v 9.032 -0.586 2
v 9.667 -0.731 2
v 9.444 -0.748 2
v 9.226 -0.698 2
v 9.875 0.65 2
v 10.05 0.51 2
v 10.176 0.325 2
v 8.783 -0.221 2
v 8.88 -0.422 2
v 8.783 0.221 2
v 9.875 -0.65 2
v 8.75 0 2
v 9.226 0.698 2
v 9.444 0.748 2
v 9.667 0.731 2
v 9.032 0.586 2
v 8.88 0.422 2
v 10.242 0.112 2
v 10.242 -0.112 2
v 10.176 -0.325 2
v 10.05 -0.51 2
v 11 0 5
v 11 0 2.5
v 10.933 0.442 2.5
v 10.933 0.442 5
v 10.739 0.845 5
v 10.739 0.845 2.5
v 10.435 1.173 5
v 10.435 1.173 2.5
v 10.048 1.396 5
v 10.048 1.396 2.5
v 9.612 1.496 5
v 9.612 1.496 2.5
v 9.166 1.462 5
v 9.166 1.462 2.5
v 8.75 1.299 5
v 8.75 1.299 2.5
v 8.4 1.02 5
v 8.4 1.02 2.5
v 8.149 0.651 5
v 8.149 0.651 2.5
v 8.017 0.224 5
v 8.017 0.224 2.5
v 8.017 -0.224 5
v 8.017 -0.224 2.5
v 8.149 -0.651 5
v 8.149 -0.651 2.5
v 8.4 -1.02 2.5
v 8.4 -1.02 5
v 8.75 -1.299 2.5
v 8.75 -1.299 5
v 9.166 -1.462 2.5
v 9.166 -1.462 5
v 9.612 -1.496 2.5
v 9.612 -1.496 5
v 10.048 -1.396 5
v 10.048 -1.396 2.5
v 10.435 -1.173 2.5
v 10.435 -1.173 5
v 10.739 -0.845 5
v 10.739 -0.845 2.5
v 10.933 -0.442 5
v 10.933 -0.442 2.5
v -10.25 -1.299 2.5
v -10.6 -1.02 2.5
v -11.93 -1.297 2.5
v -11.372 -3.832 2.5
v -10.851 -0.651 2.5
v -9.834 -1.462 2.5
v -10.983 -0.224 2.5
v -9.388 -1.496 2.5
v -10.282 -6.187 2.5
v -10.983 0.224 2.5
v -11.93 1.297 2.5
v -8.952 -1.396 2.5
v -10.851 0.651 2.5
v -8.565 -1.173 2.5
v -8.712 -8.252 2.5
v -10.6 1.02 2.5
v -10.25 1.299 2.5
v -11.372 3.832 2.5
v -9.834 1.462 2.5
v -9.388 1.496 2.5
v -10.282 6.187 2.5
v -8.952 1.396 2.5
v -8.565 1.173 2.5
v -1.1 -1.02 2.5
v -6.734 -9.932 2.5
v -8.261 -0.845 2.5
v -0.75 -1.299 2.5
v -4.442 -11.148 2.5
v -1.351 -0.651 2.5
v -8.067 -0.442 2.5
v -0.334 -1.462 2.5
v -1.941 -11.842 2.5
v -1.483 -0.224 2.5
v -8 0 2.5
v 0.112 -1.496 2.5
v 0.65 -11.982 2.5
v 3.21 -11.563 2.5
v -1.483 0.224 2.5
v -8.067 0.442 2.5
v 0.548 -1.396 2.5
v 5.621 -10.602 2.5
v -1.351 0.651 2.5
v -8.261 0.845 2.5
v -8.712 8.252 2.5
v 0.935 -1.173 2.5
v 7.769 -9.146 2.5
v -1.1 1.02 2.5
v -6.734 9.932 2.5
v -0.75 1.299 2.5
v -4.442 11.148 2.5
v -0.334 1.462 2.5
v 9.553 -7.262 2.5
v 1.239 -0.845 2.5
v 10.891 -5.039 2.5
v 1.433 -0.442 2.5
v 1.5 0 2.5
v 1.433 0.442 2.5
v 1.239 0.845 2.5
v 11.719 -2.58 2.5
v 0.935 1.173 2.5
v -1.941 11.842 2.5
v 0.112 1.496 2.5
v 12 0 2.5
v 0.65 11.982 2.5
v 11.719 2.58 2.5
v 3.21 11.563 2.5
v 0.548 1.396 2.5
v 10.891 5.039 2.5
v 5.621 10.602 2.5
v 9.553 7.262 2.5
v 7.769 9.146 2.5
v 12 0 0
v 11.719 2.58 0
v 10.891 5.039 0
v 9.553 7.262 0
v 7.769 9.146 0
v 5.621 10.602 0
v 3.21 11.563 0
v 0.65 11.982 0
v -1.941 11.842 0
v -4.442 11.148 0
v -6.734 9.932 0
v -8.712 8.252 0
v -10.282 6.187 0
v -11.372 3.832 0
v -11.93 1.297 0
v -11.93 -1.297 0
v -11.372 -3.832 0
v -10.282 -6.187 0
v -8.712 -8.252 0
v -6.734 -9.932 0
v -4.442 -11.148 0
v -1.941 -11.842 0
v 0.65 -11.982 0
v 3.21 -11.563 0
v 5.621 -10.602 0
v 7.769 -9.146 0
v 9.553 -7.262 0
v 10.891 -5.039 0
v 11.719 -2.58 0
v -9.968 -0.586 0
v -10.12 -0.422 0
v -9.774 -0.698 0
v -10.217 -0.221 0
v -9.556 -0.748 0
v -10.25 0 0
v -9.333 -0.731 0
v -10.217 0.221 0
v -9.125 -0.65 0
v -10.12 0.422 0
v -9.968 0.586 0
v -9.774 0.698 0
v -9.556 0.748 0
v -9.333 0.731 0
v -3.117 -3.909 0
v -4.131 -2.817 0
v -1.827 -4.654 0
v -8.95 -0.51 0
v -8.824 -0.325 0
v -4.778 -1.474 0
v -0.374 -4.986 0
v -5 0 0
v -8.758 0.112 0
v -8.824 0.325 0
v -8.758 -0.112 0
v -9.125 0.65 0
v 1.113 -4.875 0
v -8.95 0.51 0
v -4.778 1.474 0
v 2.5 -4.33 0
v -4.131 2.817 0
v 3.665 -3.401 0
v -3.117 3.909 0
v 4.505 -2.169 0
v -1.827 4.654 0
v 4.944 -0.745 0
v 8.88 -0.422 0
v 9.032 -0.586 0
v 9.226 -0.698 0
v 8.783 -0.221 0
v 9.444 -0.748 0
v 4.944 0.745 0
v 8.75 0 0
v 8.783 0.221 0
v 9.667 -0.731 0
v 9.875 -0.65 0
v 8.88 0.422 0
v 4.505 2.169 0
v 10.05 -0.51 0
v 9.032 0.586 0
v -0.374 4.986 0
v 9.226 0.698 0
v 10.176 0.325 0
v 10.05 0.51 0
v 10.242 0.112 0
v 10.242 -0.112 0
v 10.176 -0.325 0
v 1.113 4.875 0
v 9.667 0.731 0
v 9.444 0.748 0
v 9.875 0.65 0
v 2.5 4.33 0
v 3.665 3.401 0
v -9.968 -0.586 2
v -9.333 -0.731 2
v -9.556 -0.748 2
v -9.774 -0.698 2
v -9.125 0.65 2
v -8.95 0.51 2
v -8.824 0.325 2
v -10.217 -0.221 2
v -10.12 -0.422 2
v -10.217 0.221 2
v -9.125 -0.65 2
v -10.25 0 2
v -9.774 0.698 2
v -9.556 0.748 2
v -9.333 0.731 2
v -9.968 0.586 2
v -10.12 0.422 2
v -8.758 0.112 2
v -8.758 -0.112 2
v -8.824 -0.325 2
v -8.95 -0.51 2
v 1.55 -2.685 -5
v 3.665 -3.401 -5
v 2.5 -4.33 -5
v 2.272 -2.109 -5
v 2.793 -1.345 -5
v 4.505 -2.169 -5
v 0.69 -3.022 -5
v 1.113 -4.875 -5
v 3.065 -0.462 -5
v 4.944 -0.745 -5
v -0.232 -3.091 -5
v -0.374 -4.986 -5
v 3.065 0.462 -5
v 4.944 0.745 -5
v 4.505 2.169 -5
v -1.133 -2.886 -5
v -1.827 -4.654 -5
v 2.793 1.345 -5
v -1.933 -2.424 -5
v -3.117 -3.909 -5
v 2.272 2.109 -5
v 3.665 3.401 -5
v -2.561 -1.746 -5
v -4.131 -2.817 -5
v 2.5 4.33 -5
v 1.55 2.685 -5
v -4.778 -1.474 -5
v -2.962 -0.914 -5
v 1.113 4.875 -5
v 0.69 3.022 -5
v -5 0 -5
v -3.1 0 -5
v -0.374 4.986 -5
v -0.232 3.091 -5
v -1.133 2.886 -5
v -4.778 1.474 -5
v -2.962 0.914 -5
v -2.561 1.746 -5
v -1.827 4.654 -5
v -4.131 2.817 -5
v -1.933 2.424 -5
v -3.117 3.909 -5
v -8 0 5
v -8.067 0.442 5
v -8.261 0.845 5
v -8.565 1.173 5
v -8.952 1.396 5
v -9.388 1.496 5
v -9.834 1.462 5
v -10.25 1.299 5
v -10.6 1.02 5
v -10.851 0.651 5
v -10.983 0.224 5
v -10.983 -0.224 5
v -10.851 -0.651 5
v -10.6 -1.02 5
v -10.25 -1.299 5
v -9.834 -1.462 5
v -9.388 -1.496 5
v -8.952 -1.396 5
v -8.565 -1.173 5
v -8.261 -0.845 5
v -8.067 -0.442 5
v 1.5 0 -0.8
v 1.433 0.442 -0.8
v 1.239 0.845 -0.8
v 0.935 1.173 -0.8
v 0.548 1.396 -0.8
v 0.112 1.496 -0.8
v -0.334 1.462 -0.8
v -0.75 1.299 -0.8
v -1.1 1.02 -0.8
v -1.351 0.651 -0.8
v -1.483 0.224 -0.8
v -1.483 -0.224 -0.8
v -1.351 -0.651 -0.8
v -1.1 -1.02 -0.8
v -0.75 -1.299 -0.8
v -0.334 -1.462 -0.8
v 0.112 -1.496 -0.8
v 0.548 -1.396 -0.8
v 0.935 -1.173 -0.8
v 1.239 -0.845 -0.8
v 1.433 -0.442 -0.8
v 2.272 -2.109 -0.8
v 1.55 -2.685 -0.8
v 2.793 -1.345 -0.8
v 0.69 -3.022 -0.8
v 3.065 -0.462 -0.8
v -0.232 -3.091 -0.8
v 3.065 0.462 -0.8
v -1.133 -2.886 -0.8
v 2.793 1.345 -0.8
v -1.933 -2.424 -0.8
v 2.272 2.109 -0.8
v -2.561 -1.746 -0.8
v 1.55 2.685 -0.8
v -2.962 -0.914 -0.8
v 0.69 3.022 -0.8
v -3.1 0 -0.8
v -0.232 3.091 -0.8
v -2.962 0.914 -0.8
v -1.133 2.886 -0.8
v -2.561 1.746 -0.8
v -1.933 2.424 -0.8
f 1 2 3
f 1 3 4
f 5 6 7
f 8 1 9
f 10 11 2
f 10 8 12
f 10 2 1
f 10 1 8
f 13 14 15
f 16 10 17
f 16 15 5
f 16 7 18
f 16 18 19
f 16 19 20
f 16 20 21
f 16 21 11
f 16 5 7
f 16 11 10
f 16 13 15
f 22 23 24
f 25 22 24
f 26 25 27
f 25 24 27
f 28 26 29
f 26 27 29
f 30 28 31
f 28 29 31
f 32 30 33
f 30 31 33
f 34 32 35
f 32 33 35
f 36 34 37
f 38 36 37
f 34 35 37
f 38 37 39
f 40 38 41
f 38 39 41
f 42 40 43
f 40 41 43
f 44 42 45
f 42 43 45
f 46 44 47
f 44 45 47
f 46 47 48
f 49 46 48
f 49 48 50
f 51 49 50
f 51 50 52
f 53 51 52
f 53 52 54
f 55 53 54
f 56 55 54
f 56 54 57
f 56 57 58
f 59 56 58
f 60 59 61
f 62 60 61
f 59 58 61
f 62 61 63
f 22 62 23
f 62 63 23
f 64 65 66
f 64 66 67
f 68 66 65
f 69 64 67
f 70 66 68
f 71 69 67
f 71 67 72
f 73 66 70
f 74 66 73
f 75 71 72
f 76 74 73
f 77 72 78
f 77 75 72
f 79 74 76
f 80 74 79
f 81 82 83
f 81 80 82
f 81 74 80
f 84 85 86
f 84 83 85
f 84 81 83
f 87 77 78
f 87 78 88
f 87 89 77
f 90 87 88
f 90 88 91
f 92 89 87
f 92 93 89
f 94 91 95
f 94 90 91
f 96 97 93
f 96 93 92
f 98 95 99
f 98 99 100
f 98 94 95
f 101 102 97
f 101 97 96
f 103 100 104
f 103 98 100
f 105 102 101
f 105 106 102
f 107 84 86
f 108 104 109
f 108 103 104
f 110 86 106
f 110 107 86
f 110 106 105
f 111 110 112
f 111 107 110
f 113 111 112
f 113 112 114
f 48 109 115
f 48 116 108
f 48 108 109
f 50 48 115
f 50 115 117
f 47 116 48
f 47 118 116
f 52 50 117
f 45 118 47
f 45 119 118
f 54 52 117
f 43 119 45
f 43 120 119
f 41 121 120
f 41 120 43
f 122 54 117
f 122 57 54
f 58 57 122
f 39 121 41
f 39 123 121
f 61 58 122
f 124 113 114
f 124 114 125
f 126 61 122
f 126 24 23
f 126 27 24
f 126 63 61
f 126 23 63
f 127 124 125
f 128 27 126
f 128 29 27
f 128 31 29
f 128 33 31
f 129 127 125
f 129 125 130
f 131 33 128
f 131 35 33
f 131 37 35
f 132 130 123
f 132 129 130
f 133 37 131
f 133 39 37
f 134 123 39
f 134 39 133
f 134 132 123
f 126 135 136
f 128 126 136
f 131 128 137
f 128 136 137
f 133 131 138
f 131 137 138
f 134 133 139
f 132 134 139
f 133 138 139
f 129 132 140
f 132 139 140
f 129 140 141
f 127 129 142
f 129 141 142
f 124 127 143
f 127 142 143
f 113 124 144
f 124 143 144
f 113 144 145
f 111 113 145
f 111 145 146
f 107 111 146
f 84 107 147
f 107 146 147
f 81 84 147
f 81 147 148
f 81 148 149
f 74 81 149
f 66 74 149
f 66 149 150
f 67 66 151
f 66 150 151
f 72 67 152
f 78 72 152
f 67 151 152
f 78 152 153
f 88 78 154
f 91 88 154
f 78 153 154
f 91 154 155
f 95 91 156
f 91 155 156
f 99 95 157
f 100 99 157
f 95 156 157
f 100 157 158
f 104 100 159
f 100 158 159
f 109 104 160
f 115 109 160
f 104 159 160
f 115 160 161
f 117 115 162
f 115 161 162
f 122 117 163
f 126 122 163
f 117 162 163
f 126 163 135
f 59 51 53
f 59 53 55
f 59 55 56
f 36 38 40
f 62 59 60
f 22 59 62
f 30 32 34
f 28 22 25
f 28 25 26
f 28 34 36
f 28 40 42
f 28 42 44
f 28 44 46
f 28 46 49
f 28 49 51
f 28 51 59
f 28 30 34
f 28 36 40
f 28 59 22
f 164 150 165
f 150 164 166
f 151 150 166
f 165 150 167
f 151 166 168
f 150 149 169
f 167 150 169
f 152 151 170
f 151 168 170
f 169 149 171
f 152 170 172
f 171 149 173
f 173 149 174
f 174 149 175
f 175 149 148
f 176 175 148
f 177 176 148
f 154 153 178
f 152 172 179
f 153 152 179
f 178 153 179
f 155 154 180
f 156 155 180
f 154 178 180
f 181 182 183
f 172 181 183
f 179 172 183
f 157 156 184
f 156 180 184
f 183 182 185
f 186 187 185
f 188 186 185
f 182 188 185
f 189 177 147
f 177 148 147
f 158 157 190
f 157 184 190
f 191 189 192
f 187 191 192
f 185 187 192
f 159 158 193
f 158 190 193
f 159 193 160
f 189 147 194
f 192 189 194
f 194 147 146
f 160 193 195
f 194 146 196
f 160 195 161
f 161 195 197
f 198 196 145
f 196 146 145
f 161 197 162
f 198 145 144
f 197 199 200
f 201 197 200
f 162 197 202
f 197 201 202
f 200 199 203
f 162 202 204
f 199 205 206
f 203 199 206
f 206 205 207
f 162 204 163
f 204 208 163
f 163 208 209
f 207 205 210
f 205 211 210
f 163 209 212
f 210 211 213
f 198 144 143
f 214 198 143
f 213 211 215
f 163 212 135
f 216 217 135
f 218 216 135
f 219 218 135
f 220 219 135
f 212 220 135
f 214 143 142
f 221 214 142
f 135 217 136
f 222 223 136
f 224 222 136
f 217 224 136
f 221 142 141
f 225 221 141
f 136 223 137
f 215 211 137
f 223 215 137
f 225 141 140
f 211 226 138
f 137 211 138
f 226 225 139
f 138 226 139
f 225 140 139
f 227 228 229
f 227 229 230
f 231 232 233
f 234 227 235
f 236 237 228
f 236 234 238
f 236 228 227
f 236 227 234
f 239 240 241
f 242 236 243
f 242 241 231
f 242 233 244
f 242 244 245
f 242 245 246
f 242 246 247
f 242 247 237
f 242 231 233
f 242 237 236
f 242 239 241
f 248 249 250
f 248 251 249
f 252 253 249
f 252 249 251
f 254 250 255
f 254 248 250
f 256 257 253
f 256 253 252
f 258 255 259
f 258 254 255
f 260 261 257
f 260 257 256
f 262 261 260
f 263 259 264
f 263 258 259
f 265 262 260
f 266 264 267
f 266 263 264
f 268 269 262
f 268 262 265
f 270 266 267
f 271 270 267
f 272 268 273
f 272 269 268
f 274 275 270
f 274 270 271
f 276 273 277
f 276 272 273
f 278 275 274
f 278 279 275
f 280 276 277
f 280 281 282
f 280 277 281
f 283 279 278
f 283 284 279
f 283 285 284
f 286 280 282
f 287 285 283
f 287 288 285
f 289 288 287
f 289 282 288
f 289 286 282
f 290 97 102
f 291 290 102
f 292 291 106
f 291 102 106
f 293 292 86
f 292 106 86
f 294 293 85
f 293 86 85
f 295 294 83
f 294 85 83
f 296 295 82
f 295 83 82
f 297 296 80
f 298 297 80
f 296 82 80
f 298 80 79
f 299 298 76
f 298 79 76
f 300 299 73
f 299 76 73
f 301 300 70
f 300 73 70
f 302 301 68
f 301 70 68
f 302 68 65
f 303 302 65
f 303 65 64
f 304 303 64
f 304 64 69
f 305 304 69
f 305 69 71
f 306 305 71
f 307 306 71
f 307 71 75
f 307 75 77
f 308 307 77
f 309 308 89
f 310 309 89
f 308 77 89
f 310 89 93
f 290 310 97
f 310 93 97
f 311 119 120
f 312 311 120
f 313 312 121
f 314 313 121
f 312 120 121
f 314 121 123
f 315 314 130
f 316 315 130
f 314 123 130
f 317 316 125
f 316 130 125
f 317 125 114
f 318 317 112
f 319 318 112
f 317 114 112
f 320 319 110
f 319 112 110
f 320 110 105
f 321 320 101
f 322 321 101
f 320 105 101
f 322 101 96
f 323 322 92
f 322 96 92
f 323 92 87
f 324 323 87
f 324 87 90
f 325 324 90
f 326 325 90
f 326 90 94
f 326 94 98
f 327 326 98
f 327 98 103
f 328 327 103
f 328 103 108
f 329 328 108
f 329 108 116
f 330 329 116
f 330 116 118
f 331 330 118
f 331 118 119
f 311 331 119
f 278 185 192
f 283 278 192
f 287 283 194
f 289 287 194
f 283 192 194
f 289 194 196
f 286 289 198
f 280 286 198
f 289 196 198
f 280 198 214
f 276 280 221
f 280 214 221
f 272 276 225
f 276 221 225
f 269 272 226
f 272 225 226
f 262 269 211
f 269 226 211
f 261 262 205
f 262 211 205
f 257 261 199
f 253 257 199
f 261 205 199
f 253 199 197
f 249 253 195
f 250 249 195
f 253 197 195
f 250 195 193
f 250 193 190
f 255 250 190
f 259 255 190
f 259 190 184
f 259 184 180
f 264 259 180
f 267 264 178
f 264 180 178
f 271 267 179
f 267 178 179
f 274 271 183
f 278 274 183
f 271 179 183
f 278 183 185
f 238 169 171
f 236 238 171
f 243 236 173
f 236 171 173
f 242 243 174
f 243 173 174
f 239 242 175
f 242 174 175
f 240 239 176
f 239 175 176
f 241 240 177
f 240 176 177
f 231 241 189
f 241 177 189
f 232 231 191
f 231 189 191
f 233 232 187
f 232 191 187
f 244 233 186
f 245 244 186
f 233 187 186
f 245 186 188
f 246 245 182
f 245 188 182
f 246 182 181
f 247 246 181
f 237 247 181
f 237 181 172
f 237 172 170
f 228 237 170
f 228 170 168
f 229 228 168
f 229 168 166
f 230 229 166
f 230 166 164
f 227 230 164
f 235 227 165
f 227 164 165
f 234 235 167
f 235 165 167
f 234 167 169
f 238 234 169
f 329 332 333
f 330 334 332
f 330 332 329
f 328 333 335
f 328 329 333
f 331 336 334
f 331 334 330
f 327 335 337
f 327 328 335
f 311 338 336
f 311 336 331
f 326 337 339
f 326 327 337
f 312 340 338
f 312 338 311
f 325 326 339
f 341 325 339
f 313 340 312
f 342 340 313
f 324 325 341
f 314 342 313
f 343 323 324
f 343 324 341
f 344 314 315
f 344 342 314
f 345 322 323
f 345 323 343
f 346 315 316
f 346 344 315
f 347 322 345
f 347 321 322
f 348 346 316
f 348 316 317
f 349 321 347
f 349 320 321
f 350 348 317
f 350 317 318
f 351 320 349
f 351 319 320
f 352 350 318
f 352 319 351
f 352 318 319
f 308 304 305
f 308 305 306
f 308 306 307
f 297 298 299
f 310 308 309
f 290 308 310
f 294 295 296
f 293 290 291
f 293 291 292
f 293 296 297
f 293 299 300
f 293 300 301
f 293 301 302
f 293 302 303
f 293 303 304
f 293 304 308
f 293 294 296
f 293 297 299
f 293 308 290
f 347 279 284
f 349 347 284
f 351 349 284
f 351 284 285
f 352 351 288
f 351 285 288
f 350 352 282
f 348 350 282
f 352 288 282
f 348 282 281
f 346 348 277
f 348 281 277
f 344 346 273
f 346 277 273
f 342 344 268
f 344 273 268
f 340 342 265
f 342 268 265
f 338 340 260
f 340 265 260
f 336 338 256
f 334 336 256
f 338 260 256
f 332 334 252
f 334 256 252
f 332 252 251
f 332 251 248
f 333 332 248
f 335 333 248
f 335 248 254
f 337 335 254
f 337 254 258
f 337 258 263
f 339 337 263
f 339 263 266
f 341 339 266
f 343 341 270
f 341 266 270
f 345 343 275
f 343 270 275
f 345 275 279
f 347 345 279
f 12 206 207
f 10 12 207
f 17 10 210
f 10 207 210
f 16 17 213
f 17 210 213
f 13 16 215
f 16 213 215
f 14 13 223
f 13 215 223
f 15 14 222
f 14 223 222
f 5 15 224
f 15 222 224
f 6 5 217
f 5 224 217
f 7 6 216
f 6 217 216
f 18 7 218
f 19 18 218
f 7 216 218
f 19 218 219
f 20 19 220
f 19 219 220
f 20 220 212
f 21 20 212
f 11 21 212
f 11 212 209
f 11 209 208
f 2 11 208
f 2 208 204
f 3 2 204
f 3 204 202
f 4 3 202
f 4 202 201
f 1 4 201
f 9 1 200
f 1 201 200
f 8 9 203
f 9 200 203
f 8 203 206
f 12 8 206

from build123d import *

# Parameters (mm, degrees)
CROQUIS1_R              = 12
SALIENTE_EXTRUIR1_DEPTH = 2.5
CROQUIS2_R              = 5
SALIENTE_EXTRUIR2_DEPTH = 5
CROQUIS3_R              = 3.1
CORTAR_EXTRUIR1_DEPTH   = 4.2
CROQUIS4_R              = 1.5
CORTAR_EXTRUIR2_DEPTH   = 4
CROQUIS5_R              = 1.5
SALIENTE_EXTRUIR3_DEPTH = 2.5
CROQUIS6_R              = 0.75
CORTAR_EXTRUIR3_DEPTH   = 2


with BuildPart() as part:
    # Croquis1 → Saliente-Extruir1 (new body)
    with BuildSketch(Plane.XY):
        Circle(CROQUIS1_R)
    extrude(amount=SALIENTE_EXTRUIR1_DEPTH)

    # Croquis2 → Saliente-Extruir2 (add)
    with BuildSketch(Plane(origin=(0, 0, 0), x_dir=(-1, 0, 0), z_dir=(0, 0, -1))):
        Circle(CROQUIS2_R)
    extrude(amount=SALIENTE_EXTRUIR2_DEPTH)

    # Croquis3 → Cortar-Extruir1 (cut)
    with BuildSketch(Plane(origin=(0, 0, -5), x_dir=(-1, 0, 0), z_dir=(0, 0, -1))):
        Circle(CROQUIS3_R)
    extrude(amount=-CORTAR_EXTRUIR1_DEPTH, mode=Mode.SUBTRACT)

    # Croquis4 → Cortar-Extruir2 (cut)
    with BuildSketch(Plane.XY.offset(2.5)):
        Circle(CROQUIS4_R)
    extrude(amount=-CORTAR_EXTRUIR2_DEPTH, mode=Mode.SUBTRACT)

    # Croquis5 → Saliente-Extruir3 (add)
    with BuildSketch(Plane.XY.offset(2.5)):
        with Locations((9.5, 0)):
            Circle(CROQUIS5_R)
        with Locations((-9.5, 0)):
            Circle(CROQUIS5_R)
    extrude(amount=SALIENTE_EXTRUIR3_DEPTH)

    # Croquis6 → Cortar-Extruir3 (cut)
    with BuildSketch(Plane(origin=(0, 0, 0), x_dir=(-1, 0, 0), z_dir=(0, 0, -1))):
        with Locations((-9.5, 0)):
            Circle(CROQUIS6_R)
        with Locations((9.5, 0)):
            Circle(CROQUIS6_R)
    extrude(amount=-CORTAR_EXTRUIR3_DEPTH, mode=Mode.SUBTRACT)


solid = part.part
